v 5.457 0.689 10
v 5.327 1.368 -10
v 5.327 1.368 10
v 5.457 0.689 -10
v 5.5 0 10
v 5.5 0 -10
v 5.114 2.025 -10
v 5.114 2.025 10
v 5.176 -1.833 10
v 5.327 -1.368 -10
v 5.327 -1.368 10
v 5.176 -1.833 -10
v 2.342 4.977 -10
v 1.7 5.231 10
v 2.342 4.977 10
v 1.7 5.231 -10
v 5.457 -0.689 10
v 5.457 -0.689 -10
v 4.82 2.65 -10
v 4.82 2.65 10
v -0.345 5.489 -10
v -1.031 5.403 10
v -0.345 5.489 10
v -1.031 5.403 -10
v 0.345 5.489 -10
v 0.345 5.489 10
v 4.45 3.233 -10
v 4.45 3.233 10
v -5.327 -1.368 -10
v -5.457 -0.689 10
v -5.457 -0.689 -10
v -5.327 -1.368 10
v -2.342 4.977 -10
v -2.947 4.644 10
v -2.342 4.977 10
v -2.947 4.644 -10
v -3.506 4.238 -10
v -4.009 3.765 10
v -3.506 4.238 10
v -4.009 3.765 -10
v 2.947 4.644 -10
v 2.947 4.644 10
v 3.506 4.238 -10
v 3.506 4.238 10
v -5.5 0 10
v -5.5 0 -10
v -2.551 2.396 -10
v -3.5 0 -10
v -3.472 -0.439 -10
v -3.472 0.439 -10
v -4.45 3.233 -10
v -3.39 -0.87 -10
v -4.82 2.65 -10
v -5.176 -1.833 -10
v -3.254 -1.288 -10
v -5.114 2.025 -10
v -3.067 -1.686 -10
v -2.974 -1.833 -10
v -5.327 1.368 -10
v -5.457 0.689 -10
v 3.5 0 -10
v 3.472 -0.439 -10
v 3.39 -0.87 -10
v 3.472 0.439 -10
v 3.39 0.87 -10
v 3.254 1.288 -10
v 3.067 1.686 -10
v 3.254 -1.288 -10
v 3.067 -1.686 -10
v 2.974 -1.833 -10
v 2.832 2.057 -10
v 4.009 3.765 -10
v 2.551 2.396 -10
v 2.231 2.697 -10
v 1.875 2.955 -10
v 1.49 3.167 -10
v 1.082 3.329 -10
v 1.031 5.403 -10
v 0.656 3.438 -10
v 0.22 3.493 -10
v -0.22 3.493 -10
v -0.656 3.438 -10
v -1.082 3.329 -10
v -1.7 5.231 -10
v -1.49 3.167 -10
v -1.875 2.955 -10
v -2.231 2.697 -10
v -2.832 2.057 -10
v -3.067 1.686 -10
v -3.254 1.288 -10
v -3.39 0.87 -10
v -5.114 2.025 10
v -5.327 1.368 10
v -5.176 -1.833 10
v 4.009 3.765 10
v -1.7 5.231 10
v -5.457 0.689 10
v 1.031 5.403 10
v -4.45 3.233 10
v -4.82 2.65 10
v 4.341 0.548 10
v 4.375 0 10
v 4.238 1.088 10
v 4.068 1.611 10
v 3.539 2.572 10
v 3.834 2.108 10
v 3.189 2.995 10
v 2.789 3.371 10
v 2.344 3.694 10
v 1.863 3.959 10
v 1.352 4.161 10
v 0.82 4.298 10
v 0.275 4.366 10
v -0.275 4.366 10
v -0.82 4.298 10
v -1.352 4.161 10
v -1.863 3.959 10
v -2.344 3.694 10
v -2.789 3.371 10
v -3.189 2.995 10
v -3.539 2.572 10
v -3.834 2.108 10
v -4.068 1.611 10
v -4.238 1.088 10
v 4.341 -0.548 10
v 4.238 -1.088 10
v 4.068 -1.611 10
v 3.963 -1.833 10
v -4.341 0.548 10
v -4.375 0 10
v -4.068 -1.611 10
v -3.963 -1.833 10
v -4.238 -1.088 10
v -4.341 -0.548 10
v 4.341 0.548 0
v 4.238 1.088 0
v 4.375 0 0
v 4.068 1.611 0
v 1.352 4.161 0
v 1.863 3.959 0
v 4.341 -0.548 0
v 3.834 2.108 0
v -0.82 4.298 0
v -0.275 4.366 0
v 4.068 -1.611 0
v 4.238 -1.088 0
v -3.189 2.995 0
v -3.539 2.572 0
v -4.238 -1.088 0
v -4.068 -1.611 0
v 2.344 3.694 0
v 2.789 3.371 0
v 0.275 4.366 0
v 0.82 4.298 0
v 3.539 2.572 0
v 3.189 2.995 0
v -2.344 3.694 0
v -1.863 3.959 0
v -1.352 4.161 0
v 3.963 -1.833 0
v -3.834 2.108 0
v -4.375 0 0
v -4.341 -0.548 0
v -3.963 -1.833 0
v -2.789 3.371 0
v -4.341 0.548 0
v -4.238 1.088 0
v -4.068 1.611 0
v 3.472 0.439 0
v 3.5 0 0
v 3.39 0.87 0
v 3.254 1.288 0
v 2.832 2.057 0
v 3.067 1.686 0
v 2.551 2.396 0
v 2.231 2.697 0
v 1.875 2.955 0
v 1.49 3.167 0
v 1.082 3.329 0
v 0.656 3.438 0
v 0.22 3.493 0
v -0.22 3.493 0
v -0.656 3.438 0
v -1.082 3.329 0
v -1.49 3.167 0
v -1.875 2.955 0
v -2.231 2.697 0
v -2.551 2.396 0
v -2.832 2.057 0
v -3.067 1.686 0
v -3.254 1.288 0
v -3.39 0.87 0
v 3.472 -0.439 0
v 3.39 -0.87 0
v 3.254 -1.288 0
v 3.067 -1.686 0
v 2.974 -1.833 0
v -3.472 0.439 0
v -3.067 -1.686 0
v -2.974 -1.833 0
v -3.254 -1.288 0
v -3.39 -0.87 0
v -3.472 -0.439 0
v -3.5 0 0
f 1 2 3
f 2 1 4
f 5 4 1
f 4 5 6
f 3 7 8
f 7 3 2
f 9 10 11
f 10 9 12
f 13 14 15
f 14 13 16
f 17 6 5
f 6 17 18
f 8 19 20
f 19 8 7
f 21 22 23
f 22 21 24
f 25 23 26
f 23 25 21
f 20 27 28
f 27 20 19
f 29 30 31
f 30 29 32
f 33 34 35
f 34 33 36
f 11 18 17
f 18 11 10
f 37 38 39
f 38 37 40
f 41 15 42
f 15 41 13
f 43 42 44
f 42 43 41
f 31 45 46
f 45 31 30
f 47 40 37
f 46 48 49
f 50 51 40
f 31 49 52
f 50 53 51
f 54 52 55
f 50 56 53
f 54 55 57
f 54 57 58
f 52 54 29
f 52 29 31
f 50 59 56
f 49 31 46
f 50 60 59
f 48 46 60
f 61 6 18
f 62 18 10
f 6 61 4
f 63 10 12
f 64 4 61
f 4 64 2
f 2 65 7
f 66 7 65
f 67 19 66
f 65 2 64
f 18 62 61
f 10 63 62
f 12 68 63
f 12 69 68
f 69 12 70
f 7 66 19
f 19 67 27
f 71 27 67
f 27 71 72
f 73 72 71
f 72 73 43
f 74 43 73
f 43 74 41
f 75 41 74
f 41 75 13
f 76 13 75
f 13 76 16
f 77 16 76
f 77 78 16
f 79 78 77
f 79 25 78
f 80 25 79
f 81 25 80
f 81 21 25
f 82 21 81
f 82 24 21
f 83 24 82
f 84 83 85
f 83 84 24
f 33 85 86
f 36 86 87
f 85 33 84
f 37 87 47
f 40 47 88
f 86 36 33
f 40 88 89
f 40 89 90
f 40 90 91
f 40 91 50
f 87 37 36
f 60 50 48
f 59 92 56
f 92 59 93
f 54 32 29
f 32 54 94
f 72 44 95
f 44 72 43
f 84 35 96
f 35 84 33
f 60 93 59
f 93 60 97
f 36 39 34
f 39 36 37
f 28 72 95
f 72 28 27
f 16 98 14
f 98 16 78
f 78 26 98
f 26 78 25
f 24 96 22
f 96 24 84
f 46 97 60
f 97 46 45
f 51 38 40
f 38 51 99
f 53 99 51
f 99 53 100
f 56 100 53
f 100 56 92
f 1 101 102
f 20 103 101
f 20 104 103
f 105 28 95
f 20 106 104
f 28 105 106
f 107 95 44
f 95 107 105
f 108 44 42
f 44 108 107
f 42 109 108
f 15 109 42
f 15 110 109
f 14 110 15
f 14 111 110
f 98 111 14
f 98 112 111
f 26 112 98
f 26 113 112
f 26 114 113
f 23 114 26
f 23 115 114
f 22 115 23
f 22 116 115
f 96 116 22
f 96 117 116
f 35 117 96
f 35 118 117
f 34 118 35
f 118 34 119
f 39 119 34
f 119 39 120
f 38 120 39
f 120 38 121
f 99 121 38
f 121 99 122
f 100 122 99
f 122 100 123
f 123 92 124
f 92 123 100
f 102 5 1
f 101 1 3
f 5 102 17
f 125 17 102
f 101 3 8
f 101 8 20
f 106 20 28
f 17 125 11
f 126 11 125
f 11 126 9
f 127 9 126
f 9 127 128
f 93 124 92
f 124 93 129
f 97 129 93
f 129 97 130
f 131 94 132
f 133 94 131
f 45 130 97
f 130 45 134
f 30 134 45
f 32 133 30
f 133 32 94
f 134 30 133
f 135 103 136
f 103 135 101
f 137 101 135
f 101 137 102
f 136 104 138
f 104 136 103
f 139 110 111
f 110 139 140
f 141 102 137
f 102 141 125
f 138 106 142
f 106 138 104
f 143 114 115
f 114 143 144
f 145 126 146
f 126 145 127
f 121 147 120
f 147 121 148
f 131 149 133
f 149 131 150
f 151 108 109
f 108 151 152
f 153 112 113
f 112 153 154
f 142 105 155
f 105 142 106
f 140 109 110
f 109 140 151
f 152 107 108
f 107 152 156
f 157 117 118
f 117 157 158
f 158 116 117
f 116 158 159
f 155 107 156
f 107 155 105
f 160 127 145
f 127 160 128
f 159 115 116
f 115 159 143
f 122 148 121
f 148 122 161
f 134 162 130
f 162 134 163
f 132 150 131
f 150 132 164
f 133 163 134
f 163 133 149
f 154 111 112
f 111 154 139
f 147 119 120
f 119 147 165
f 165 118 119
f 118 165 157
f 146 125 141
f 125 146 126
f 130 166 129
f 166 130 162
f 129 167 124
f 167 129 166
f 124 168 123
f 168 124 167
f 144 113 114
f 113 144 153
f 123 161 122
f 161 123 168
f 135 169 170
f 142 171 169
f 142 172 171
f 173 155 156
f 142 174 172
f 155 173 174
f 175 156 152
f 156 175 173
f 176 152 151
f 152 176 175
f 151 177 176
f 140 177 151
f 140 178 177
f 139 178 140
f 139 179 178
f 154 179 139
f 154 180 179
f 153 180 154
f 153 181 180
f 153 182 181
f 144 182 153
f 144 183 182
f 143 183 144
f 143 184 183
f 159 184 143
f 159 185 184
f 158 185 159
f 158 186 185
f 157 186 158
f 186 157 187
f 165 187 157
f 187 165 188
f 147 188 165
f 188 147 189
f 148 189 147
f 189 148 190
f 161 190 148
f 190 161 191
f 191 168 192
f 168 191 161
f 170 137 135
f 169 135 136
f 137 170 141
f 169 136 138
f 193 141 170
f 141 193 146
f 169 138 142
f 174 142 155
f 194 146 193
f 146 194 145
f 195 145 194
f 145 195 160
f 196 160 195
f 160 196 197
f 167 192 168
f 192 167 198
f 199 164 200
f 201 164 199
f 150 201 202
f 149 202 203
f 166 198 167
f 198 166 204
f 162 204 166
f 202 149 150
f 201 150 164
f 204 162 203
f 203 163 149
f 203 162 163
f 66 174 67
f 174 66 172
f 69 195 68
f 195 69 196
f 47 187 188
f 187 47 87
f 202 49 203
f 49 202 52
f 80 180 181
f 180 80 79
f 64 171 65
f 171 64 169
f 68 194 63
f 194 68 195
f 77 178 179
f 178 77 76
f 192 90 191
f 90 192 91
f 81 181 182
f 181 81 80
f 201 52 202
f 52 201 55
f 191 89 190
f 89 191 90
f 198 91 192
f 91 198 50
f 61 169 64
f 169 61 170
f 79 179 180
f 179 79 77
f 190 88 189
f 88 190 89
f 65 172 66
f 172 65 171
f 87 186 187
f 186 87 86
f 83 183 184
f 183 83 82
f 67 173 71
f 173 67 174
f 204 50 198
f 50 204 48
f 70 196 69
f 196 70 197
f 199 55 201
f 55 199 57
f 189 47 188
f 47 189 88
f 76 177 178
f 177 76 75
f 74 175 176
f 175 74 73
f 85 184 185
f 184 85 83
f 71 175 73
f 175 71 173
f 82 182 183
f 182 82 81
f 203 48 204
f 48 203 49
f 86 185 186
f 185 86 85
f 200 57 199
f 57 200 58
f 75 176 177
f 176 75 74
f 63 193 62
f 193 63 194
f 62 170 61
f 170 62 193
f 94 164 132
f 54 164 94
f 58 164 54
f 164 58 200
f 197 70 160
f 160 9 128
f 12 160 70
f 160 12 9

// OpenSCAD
do = 11;

d1 = 8.75;
d2 = 7.0;
l = 10;

$fn = 50;

intersection(){
difference(){
    cylinder(d = do, h = l * 2, center=true);

    cylinder(d = d1, h = l);

    mirror([0,0,1])    
        cylinder(d = d2, h = l);
}

translate([0,do/3,0])
    cube(size=[do,do,l*2], center=true);
}
